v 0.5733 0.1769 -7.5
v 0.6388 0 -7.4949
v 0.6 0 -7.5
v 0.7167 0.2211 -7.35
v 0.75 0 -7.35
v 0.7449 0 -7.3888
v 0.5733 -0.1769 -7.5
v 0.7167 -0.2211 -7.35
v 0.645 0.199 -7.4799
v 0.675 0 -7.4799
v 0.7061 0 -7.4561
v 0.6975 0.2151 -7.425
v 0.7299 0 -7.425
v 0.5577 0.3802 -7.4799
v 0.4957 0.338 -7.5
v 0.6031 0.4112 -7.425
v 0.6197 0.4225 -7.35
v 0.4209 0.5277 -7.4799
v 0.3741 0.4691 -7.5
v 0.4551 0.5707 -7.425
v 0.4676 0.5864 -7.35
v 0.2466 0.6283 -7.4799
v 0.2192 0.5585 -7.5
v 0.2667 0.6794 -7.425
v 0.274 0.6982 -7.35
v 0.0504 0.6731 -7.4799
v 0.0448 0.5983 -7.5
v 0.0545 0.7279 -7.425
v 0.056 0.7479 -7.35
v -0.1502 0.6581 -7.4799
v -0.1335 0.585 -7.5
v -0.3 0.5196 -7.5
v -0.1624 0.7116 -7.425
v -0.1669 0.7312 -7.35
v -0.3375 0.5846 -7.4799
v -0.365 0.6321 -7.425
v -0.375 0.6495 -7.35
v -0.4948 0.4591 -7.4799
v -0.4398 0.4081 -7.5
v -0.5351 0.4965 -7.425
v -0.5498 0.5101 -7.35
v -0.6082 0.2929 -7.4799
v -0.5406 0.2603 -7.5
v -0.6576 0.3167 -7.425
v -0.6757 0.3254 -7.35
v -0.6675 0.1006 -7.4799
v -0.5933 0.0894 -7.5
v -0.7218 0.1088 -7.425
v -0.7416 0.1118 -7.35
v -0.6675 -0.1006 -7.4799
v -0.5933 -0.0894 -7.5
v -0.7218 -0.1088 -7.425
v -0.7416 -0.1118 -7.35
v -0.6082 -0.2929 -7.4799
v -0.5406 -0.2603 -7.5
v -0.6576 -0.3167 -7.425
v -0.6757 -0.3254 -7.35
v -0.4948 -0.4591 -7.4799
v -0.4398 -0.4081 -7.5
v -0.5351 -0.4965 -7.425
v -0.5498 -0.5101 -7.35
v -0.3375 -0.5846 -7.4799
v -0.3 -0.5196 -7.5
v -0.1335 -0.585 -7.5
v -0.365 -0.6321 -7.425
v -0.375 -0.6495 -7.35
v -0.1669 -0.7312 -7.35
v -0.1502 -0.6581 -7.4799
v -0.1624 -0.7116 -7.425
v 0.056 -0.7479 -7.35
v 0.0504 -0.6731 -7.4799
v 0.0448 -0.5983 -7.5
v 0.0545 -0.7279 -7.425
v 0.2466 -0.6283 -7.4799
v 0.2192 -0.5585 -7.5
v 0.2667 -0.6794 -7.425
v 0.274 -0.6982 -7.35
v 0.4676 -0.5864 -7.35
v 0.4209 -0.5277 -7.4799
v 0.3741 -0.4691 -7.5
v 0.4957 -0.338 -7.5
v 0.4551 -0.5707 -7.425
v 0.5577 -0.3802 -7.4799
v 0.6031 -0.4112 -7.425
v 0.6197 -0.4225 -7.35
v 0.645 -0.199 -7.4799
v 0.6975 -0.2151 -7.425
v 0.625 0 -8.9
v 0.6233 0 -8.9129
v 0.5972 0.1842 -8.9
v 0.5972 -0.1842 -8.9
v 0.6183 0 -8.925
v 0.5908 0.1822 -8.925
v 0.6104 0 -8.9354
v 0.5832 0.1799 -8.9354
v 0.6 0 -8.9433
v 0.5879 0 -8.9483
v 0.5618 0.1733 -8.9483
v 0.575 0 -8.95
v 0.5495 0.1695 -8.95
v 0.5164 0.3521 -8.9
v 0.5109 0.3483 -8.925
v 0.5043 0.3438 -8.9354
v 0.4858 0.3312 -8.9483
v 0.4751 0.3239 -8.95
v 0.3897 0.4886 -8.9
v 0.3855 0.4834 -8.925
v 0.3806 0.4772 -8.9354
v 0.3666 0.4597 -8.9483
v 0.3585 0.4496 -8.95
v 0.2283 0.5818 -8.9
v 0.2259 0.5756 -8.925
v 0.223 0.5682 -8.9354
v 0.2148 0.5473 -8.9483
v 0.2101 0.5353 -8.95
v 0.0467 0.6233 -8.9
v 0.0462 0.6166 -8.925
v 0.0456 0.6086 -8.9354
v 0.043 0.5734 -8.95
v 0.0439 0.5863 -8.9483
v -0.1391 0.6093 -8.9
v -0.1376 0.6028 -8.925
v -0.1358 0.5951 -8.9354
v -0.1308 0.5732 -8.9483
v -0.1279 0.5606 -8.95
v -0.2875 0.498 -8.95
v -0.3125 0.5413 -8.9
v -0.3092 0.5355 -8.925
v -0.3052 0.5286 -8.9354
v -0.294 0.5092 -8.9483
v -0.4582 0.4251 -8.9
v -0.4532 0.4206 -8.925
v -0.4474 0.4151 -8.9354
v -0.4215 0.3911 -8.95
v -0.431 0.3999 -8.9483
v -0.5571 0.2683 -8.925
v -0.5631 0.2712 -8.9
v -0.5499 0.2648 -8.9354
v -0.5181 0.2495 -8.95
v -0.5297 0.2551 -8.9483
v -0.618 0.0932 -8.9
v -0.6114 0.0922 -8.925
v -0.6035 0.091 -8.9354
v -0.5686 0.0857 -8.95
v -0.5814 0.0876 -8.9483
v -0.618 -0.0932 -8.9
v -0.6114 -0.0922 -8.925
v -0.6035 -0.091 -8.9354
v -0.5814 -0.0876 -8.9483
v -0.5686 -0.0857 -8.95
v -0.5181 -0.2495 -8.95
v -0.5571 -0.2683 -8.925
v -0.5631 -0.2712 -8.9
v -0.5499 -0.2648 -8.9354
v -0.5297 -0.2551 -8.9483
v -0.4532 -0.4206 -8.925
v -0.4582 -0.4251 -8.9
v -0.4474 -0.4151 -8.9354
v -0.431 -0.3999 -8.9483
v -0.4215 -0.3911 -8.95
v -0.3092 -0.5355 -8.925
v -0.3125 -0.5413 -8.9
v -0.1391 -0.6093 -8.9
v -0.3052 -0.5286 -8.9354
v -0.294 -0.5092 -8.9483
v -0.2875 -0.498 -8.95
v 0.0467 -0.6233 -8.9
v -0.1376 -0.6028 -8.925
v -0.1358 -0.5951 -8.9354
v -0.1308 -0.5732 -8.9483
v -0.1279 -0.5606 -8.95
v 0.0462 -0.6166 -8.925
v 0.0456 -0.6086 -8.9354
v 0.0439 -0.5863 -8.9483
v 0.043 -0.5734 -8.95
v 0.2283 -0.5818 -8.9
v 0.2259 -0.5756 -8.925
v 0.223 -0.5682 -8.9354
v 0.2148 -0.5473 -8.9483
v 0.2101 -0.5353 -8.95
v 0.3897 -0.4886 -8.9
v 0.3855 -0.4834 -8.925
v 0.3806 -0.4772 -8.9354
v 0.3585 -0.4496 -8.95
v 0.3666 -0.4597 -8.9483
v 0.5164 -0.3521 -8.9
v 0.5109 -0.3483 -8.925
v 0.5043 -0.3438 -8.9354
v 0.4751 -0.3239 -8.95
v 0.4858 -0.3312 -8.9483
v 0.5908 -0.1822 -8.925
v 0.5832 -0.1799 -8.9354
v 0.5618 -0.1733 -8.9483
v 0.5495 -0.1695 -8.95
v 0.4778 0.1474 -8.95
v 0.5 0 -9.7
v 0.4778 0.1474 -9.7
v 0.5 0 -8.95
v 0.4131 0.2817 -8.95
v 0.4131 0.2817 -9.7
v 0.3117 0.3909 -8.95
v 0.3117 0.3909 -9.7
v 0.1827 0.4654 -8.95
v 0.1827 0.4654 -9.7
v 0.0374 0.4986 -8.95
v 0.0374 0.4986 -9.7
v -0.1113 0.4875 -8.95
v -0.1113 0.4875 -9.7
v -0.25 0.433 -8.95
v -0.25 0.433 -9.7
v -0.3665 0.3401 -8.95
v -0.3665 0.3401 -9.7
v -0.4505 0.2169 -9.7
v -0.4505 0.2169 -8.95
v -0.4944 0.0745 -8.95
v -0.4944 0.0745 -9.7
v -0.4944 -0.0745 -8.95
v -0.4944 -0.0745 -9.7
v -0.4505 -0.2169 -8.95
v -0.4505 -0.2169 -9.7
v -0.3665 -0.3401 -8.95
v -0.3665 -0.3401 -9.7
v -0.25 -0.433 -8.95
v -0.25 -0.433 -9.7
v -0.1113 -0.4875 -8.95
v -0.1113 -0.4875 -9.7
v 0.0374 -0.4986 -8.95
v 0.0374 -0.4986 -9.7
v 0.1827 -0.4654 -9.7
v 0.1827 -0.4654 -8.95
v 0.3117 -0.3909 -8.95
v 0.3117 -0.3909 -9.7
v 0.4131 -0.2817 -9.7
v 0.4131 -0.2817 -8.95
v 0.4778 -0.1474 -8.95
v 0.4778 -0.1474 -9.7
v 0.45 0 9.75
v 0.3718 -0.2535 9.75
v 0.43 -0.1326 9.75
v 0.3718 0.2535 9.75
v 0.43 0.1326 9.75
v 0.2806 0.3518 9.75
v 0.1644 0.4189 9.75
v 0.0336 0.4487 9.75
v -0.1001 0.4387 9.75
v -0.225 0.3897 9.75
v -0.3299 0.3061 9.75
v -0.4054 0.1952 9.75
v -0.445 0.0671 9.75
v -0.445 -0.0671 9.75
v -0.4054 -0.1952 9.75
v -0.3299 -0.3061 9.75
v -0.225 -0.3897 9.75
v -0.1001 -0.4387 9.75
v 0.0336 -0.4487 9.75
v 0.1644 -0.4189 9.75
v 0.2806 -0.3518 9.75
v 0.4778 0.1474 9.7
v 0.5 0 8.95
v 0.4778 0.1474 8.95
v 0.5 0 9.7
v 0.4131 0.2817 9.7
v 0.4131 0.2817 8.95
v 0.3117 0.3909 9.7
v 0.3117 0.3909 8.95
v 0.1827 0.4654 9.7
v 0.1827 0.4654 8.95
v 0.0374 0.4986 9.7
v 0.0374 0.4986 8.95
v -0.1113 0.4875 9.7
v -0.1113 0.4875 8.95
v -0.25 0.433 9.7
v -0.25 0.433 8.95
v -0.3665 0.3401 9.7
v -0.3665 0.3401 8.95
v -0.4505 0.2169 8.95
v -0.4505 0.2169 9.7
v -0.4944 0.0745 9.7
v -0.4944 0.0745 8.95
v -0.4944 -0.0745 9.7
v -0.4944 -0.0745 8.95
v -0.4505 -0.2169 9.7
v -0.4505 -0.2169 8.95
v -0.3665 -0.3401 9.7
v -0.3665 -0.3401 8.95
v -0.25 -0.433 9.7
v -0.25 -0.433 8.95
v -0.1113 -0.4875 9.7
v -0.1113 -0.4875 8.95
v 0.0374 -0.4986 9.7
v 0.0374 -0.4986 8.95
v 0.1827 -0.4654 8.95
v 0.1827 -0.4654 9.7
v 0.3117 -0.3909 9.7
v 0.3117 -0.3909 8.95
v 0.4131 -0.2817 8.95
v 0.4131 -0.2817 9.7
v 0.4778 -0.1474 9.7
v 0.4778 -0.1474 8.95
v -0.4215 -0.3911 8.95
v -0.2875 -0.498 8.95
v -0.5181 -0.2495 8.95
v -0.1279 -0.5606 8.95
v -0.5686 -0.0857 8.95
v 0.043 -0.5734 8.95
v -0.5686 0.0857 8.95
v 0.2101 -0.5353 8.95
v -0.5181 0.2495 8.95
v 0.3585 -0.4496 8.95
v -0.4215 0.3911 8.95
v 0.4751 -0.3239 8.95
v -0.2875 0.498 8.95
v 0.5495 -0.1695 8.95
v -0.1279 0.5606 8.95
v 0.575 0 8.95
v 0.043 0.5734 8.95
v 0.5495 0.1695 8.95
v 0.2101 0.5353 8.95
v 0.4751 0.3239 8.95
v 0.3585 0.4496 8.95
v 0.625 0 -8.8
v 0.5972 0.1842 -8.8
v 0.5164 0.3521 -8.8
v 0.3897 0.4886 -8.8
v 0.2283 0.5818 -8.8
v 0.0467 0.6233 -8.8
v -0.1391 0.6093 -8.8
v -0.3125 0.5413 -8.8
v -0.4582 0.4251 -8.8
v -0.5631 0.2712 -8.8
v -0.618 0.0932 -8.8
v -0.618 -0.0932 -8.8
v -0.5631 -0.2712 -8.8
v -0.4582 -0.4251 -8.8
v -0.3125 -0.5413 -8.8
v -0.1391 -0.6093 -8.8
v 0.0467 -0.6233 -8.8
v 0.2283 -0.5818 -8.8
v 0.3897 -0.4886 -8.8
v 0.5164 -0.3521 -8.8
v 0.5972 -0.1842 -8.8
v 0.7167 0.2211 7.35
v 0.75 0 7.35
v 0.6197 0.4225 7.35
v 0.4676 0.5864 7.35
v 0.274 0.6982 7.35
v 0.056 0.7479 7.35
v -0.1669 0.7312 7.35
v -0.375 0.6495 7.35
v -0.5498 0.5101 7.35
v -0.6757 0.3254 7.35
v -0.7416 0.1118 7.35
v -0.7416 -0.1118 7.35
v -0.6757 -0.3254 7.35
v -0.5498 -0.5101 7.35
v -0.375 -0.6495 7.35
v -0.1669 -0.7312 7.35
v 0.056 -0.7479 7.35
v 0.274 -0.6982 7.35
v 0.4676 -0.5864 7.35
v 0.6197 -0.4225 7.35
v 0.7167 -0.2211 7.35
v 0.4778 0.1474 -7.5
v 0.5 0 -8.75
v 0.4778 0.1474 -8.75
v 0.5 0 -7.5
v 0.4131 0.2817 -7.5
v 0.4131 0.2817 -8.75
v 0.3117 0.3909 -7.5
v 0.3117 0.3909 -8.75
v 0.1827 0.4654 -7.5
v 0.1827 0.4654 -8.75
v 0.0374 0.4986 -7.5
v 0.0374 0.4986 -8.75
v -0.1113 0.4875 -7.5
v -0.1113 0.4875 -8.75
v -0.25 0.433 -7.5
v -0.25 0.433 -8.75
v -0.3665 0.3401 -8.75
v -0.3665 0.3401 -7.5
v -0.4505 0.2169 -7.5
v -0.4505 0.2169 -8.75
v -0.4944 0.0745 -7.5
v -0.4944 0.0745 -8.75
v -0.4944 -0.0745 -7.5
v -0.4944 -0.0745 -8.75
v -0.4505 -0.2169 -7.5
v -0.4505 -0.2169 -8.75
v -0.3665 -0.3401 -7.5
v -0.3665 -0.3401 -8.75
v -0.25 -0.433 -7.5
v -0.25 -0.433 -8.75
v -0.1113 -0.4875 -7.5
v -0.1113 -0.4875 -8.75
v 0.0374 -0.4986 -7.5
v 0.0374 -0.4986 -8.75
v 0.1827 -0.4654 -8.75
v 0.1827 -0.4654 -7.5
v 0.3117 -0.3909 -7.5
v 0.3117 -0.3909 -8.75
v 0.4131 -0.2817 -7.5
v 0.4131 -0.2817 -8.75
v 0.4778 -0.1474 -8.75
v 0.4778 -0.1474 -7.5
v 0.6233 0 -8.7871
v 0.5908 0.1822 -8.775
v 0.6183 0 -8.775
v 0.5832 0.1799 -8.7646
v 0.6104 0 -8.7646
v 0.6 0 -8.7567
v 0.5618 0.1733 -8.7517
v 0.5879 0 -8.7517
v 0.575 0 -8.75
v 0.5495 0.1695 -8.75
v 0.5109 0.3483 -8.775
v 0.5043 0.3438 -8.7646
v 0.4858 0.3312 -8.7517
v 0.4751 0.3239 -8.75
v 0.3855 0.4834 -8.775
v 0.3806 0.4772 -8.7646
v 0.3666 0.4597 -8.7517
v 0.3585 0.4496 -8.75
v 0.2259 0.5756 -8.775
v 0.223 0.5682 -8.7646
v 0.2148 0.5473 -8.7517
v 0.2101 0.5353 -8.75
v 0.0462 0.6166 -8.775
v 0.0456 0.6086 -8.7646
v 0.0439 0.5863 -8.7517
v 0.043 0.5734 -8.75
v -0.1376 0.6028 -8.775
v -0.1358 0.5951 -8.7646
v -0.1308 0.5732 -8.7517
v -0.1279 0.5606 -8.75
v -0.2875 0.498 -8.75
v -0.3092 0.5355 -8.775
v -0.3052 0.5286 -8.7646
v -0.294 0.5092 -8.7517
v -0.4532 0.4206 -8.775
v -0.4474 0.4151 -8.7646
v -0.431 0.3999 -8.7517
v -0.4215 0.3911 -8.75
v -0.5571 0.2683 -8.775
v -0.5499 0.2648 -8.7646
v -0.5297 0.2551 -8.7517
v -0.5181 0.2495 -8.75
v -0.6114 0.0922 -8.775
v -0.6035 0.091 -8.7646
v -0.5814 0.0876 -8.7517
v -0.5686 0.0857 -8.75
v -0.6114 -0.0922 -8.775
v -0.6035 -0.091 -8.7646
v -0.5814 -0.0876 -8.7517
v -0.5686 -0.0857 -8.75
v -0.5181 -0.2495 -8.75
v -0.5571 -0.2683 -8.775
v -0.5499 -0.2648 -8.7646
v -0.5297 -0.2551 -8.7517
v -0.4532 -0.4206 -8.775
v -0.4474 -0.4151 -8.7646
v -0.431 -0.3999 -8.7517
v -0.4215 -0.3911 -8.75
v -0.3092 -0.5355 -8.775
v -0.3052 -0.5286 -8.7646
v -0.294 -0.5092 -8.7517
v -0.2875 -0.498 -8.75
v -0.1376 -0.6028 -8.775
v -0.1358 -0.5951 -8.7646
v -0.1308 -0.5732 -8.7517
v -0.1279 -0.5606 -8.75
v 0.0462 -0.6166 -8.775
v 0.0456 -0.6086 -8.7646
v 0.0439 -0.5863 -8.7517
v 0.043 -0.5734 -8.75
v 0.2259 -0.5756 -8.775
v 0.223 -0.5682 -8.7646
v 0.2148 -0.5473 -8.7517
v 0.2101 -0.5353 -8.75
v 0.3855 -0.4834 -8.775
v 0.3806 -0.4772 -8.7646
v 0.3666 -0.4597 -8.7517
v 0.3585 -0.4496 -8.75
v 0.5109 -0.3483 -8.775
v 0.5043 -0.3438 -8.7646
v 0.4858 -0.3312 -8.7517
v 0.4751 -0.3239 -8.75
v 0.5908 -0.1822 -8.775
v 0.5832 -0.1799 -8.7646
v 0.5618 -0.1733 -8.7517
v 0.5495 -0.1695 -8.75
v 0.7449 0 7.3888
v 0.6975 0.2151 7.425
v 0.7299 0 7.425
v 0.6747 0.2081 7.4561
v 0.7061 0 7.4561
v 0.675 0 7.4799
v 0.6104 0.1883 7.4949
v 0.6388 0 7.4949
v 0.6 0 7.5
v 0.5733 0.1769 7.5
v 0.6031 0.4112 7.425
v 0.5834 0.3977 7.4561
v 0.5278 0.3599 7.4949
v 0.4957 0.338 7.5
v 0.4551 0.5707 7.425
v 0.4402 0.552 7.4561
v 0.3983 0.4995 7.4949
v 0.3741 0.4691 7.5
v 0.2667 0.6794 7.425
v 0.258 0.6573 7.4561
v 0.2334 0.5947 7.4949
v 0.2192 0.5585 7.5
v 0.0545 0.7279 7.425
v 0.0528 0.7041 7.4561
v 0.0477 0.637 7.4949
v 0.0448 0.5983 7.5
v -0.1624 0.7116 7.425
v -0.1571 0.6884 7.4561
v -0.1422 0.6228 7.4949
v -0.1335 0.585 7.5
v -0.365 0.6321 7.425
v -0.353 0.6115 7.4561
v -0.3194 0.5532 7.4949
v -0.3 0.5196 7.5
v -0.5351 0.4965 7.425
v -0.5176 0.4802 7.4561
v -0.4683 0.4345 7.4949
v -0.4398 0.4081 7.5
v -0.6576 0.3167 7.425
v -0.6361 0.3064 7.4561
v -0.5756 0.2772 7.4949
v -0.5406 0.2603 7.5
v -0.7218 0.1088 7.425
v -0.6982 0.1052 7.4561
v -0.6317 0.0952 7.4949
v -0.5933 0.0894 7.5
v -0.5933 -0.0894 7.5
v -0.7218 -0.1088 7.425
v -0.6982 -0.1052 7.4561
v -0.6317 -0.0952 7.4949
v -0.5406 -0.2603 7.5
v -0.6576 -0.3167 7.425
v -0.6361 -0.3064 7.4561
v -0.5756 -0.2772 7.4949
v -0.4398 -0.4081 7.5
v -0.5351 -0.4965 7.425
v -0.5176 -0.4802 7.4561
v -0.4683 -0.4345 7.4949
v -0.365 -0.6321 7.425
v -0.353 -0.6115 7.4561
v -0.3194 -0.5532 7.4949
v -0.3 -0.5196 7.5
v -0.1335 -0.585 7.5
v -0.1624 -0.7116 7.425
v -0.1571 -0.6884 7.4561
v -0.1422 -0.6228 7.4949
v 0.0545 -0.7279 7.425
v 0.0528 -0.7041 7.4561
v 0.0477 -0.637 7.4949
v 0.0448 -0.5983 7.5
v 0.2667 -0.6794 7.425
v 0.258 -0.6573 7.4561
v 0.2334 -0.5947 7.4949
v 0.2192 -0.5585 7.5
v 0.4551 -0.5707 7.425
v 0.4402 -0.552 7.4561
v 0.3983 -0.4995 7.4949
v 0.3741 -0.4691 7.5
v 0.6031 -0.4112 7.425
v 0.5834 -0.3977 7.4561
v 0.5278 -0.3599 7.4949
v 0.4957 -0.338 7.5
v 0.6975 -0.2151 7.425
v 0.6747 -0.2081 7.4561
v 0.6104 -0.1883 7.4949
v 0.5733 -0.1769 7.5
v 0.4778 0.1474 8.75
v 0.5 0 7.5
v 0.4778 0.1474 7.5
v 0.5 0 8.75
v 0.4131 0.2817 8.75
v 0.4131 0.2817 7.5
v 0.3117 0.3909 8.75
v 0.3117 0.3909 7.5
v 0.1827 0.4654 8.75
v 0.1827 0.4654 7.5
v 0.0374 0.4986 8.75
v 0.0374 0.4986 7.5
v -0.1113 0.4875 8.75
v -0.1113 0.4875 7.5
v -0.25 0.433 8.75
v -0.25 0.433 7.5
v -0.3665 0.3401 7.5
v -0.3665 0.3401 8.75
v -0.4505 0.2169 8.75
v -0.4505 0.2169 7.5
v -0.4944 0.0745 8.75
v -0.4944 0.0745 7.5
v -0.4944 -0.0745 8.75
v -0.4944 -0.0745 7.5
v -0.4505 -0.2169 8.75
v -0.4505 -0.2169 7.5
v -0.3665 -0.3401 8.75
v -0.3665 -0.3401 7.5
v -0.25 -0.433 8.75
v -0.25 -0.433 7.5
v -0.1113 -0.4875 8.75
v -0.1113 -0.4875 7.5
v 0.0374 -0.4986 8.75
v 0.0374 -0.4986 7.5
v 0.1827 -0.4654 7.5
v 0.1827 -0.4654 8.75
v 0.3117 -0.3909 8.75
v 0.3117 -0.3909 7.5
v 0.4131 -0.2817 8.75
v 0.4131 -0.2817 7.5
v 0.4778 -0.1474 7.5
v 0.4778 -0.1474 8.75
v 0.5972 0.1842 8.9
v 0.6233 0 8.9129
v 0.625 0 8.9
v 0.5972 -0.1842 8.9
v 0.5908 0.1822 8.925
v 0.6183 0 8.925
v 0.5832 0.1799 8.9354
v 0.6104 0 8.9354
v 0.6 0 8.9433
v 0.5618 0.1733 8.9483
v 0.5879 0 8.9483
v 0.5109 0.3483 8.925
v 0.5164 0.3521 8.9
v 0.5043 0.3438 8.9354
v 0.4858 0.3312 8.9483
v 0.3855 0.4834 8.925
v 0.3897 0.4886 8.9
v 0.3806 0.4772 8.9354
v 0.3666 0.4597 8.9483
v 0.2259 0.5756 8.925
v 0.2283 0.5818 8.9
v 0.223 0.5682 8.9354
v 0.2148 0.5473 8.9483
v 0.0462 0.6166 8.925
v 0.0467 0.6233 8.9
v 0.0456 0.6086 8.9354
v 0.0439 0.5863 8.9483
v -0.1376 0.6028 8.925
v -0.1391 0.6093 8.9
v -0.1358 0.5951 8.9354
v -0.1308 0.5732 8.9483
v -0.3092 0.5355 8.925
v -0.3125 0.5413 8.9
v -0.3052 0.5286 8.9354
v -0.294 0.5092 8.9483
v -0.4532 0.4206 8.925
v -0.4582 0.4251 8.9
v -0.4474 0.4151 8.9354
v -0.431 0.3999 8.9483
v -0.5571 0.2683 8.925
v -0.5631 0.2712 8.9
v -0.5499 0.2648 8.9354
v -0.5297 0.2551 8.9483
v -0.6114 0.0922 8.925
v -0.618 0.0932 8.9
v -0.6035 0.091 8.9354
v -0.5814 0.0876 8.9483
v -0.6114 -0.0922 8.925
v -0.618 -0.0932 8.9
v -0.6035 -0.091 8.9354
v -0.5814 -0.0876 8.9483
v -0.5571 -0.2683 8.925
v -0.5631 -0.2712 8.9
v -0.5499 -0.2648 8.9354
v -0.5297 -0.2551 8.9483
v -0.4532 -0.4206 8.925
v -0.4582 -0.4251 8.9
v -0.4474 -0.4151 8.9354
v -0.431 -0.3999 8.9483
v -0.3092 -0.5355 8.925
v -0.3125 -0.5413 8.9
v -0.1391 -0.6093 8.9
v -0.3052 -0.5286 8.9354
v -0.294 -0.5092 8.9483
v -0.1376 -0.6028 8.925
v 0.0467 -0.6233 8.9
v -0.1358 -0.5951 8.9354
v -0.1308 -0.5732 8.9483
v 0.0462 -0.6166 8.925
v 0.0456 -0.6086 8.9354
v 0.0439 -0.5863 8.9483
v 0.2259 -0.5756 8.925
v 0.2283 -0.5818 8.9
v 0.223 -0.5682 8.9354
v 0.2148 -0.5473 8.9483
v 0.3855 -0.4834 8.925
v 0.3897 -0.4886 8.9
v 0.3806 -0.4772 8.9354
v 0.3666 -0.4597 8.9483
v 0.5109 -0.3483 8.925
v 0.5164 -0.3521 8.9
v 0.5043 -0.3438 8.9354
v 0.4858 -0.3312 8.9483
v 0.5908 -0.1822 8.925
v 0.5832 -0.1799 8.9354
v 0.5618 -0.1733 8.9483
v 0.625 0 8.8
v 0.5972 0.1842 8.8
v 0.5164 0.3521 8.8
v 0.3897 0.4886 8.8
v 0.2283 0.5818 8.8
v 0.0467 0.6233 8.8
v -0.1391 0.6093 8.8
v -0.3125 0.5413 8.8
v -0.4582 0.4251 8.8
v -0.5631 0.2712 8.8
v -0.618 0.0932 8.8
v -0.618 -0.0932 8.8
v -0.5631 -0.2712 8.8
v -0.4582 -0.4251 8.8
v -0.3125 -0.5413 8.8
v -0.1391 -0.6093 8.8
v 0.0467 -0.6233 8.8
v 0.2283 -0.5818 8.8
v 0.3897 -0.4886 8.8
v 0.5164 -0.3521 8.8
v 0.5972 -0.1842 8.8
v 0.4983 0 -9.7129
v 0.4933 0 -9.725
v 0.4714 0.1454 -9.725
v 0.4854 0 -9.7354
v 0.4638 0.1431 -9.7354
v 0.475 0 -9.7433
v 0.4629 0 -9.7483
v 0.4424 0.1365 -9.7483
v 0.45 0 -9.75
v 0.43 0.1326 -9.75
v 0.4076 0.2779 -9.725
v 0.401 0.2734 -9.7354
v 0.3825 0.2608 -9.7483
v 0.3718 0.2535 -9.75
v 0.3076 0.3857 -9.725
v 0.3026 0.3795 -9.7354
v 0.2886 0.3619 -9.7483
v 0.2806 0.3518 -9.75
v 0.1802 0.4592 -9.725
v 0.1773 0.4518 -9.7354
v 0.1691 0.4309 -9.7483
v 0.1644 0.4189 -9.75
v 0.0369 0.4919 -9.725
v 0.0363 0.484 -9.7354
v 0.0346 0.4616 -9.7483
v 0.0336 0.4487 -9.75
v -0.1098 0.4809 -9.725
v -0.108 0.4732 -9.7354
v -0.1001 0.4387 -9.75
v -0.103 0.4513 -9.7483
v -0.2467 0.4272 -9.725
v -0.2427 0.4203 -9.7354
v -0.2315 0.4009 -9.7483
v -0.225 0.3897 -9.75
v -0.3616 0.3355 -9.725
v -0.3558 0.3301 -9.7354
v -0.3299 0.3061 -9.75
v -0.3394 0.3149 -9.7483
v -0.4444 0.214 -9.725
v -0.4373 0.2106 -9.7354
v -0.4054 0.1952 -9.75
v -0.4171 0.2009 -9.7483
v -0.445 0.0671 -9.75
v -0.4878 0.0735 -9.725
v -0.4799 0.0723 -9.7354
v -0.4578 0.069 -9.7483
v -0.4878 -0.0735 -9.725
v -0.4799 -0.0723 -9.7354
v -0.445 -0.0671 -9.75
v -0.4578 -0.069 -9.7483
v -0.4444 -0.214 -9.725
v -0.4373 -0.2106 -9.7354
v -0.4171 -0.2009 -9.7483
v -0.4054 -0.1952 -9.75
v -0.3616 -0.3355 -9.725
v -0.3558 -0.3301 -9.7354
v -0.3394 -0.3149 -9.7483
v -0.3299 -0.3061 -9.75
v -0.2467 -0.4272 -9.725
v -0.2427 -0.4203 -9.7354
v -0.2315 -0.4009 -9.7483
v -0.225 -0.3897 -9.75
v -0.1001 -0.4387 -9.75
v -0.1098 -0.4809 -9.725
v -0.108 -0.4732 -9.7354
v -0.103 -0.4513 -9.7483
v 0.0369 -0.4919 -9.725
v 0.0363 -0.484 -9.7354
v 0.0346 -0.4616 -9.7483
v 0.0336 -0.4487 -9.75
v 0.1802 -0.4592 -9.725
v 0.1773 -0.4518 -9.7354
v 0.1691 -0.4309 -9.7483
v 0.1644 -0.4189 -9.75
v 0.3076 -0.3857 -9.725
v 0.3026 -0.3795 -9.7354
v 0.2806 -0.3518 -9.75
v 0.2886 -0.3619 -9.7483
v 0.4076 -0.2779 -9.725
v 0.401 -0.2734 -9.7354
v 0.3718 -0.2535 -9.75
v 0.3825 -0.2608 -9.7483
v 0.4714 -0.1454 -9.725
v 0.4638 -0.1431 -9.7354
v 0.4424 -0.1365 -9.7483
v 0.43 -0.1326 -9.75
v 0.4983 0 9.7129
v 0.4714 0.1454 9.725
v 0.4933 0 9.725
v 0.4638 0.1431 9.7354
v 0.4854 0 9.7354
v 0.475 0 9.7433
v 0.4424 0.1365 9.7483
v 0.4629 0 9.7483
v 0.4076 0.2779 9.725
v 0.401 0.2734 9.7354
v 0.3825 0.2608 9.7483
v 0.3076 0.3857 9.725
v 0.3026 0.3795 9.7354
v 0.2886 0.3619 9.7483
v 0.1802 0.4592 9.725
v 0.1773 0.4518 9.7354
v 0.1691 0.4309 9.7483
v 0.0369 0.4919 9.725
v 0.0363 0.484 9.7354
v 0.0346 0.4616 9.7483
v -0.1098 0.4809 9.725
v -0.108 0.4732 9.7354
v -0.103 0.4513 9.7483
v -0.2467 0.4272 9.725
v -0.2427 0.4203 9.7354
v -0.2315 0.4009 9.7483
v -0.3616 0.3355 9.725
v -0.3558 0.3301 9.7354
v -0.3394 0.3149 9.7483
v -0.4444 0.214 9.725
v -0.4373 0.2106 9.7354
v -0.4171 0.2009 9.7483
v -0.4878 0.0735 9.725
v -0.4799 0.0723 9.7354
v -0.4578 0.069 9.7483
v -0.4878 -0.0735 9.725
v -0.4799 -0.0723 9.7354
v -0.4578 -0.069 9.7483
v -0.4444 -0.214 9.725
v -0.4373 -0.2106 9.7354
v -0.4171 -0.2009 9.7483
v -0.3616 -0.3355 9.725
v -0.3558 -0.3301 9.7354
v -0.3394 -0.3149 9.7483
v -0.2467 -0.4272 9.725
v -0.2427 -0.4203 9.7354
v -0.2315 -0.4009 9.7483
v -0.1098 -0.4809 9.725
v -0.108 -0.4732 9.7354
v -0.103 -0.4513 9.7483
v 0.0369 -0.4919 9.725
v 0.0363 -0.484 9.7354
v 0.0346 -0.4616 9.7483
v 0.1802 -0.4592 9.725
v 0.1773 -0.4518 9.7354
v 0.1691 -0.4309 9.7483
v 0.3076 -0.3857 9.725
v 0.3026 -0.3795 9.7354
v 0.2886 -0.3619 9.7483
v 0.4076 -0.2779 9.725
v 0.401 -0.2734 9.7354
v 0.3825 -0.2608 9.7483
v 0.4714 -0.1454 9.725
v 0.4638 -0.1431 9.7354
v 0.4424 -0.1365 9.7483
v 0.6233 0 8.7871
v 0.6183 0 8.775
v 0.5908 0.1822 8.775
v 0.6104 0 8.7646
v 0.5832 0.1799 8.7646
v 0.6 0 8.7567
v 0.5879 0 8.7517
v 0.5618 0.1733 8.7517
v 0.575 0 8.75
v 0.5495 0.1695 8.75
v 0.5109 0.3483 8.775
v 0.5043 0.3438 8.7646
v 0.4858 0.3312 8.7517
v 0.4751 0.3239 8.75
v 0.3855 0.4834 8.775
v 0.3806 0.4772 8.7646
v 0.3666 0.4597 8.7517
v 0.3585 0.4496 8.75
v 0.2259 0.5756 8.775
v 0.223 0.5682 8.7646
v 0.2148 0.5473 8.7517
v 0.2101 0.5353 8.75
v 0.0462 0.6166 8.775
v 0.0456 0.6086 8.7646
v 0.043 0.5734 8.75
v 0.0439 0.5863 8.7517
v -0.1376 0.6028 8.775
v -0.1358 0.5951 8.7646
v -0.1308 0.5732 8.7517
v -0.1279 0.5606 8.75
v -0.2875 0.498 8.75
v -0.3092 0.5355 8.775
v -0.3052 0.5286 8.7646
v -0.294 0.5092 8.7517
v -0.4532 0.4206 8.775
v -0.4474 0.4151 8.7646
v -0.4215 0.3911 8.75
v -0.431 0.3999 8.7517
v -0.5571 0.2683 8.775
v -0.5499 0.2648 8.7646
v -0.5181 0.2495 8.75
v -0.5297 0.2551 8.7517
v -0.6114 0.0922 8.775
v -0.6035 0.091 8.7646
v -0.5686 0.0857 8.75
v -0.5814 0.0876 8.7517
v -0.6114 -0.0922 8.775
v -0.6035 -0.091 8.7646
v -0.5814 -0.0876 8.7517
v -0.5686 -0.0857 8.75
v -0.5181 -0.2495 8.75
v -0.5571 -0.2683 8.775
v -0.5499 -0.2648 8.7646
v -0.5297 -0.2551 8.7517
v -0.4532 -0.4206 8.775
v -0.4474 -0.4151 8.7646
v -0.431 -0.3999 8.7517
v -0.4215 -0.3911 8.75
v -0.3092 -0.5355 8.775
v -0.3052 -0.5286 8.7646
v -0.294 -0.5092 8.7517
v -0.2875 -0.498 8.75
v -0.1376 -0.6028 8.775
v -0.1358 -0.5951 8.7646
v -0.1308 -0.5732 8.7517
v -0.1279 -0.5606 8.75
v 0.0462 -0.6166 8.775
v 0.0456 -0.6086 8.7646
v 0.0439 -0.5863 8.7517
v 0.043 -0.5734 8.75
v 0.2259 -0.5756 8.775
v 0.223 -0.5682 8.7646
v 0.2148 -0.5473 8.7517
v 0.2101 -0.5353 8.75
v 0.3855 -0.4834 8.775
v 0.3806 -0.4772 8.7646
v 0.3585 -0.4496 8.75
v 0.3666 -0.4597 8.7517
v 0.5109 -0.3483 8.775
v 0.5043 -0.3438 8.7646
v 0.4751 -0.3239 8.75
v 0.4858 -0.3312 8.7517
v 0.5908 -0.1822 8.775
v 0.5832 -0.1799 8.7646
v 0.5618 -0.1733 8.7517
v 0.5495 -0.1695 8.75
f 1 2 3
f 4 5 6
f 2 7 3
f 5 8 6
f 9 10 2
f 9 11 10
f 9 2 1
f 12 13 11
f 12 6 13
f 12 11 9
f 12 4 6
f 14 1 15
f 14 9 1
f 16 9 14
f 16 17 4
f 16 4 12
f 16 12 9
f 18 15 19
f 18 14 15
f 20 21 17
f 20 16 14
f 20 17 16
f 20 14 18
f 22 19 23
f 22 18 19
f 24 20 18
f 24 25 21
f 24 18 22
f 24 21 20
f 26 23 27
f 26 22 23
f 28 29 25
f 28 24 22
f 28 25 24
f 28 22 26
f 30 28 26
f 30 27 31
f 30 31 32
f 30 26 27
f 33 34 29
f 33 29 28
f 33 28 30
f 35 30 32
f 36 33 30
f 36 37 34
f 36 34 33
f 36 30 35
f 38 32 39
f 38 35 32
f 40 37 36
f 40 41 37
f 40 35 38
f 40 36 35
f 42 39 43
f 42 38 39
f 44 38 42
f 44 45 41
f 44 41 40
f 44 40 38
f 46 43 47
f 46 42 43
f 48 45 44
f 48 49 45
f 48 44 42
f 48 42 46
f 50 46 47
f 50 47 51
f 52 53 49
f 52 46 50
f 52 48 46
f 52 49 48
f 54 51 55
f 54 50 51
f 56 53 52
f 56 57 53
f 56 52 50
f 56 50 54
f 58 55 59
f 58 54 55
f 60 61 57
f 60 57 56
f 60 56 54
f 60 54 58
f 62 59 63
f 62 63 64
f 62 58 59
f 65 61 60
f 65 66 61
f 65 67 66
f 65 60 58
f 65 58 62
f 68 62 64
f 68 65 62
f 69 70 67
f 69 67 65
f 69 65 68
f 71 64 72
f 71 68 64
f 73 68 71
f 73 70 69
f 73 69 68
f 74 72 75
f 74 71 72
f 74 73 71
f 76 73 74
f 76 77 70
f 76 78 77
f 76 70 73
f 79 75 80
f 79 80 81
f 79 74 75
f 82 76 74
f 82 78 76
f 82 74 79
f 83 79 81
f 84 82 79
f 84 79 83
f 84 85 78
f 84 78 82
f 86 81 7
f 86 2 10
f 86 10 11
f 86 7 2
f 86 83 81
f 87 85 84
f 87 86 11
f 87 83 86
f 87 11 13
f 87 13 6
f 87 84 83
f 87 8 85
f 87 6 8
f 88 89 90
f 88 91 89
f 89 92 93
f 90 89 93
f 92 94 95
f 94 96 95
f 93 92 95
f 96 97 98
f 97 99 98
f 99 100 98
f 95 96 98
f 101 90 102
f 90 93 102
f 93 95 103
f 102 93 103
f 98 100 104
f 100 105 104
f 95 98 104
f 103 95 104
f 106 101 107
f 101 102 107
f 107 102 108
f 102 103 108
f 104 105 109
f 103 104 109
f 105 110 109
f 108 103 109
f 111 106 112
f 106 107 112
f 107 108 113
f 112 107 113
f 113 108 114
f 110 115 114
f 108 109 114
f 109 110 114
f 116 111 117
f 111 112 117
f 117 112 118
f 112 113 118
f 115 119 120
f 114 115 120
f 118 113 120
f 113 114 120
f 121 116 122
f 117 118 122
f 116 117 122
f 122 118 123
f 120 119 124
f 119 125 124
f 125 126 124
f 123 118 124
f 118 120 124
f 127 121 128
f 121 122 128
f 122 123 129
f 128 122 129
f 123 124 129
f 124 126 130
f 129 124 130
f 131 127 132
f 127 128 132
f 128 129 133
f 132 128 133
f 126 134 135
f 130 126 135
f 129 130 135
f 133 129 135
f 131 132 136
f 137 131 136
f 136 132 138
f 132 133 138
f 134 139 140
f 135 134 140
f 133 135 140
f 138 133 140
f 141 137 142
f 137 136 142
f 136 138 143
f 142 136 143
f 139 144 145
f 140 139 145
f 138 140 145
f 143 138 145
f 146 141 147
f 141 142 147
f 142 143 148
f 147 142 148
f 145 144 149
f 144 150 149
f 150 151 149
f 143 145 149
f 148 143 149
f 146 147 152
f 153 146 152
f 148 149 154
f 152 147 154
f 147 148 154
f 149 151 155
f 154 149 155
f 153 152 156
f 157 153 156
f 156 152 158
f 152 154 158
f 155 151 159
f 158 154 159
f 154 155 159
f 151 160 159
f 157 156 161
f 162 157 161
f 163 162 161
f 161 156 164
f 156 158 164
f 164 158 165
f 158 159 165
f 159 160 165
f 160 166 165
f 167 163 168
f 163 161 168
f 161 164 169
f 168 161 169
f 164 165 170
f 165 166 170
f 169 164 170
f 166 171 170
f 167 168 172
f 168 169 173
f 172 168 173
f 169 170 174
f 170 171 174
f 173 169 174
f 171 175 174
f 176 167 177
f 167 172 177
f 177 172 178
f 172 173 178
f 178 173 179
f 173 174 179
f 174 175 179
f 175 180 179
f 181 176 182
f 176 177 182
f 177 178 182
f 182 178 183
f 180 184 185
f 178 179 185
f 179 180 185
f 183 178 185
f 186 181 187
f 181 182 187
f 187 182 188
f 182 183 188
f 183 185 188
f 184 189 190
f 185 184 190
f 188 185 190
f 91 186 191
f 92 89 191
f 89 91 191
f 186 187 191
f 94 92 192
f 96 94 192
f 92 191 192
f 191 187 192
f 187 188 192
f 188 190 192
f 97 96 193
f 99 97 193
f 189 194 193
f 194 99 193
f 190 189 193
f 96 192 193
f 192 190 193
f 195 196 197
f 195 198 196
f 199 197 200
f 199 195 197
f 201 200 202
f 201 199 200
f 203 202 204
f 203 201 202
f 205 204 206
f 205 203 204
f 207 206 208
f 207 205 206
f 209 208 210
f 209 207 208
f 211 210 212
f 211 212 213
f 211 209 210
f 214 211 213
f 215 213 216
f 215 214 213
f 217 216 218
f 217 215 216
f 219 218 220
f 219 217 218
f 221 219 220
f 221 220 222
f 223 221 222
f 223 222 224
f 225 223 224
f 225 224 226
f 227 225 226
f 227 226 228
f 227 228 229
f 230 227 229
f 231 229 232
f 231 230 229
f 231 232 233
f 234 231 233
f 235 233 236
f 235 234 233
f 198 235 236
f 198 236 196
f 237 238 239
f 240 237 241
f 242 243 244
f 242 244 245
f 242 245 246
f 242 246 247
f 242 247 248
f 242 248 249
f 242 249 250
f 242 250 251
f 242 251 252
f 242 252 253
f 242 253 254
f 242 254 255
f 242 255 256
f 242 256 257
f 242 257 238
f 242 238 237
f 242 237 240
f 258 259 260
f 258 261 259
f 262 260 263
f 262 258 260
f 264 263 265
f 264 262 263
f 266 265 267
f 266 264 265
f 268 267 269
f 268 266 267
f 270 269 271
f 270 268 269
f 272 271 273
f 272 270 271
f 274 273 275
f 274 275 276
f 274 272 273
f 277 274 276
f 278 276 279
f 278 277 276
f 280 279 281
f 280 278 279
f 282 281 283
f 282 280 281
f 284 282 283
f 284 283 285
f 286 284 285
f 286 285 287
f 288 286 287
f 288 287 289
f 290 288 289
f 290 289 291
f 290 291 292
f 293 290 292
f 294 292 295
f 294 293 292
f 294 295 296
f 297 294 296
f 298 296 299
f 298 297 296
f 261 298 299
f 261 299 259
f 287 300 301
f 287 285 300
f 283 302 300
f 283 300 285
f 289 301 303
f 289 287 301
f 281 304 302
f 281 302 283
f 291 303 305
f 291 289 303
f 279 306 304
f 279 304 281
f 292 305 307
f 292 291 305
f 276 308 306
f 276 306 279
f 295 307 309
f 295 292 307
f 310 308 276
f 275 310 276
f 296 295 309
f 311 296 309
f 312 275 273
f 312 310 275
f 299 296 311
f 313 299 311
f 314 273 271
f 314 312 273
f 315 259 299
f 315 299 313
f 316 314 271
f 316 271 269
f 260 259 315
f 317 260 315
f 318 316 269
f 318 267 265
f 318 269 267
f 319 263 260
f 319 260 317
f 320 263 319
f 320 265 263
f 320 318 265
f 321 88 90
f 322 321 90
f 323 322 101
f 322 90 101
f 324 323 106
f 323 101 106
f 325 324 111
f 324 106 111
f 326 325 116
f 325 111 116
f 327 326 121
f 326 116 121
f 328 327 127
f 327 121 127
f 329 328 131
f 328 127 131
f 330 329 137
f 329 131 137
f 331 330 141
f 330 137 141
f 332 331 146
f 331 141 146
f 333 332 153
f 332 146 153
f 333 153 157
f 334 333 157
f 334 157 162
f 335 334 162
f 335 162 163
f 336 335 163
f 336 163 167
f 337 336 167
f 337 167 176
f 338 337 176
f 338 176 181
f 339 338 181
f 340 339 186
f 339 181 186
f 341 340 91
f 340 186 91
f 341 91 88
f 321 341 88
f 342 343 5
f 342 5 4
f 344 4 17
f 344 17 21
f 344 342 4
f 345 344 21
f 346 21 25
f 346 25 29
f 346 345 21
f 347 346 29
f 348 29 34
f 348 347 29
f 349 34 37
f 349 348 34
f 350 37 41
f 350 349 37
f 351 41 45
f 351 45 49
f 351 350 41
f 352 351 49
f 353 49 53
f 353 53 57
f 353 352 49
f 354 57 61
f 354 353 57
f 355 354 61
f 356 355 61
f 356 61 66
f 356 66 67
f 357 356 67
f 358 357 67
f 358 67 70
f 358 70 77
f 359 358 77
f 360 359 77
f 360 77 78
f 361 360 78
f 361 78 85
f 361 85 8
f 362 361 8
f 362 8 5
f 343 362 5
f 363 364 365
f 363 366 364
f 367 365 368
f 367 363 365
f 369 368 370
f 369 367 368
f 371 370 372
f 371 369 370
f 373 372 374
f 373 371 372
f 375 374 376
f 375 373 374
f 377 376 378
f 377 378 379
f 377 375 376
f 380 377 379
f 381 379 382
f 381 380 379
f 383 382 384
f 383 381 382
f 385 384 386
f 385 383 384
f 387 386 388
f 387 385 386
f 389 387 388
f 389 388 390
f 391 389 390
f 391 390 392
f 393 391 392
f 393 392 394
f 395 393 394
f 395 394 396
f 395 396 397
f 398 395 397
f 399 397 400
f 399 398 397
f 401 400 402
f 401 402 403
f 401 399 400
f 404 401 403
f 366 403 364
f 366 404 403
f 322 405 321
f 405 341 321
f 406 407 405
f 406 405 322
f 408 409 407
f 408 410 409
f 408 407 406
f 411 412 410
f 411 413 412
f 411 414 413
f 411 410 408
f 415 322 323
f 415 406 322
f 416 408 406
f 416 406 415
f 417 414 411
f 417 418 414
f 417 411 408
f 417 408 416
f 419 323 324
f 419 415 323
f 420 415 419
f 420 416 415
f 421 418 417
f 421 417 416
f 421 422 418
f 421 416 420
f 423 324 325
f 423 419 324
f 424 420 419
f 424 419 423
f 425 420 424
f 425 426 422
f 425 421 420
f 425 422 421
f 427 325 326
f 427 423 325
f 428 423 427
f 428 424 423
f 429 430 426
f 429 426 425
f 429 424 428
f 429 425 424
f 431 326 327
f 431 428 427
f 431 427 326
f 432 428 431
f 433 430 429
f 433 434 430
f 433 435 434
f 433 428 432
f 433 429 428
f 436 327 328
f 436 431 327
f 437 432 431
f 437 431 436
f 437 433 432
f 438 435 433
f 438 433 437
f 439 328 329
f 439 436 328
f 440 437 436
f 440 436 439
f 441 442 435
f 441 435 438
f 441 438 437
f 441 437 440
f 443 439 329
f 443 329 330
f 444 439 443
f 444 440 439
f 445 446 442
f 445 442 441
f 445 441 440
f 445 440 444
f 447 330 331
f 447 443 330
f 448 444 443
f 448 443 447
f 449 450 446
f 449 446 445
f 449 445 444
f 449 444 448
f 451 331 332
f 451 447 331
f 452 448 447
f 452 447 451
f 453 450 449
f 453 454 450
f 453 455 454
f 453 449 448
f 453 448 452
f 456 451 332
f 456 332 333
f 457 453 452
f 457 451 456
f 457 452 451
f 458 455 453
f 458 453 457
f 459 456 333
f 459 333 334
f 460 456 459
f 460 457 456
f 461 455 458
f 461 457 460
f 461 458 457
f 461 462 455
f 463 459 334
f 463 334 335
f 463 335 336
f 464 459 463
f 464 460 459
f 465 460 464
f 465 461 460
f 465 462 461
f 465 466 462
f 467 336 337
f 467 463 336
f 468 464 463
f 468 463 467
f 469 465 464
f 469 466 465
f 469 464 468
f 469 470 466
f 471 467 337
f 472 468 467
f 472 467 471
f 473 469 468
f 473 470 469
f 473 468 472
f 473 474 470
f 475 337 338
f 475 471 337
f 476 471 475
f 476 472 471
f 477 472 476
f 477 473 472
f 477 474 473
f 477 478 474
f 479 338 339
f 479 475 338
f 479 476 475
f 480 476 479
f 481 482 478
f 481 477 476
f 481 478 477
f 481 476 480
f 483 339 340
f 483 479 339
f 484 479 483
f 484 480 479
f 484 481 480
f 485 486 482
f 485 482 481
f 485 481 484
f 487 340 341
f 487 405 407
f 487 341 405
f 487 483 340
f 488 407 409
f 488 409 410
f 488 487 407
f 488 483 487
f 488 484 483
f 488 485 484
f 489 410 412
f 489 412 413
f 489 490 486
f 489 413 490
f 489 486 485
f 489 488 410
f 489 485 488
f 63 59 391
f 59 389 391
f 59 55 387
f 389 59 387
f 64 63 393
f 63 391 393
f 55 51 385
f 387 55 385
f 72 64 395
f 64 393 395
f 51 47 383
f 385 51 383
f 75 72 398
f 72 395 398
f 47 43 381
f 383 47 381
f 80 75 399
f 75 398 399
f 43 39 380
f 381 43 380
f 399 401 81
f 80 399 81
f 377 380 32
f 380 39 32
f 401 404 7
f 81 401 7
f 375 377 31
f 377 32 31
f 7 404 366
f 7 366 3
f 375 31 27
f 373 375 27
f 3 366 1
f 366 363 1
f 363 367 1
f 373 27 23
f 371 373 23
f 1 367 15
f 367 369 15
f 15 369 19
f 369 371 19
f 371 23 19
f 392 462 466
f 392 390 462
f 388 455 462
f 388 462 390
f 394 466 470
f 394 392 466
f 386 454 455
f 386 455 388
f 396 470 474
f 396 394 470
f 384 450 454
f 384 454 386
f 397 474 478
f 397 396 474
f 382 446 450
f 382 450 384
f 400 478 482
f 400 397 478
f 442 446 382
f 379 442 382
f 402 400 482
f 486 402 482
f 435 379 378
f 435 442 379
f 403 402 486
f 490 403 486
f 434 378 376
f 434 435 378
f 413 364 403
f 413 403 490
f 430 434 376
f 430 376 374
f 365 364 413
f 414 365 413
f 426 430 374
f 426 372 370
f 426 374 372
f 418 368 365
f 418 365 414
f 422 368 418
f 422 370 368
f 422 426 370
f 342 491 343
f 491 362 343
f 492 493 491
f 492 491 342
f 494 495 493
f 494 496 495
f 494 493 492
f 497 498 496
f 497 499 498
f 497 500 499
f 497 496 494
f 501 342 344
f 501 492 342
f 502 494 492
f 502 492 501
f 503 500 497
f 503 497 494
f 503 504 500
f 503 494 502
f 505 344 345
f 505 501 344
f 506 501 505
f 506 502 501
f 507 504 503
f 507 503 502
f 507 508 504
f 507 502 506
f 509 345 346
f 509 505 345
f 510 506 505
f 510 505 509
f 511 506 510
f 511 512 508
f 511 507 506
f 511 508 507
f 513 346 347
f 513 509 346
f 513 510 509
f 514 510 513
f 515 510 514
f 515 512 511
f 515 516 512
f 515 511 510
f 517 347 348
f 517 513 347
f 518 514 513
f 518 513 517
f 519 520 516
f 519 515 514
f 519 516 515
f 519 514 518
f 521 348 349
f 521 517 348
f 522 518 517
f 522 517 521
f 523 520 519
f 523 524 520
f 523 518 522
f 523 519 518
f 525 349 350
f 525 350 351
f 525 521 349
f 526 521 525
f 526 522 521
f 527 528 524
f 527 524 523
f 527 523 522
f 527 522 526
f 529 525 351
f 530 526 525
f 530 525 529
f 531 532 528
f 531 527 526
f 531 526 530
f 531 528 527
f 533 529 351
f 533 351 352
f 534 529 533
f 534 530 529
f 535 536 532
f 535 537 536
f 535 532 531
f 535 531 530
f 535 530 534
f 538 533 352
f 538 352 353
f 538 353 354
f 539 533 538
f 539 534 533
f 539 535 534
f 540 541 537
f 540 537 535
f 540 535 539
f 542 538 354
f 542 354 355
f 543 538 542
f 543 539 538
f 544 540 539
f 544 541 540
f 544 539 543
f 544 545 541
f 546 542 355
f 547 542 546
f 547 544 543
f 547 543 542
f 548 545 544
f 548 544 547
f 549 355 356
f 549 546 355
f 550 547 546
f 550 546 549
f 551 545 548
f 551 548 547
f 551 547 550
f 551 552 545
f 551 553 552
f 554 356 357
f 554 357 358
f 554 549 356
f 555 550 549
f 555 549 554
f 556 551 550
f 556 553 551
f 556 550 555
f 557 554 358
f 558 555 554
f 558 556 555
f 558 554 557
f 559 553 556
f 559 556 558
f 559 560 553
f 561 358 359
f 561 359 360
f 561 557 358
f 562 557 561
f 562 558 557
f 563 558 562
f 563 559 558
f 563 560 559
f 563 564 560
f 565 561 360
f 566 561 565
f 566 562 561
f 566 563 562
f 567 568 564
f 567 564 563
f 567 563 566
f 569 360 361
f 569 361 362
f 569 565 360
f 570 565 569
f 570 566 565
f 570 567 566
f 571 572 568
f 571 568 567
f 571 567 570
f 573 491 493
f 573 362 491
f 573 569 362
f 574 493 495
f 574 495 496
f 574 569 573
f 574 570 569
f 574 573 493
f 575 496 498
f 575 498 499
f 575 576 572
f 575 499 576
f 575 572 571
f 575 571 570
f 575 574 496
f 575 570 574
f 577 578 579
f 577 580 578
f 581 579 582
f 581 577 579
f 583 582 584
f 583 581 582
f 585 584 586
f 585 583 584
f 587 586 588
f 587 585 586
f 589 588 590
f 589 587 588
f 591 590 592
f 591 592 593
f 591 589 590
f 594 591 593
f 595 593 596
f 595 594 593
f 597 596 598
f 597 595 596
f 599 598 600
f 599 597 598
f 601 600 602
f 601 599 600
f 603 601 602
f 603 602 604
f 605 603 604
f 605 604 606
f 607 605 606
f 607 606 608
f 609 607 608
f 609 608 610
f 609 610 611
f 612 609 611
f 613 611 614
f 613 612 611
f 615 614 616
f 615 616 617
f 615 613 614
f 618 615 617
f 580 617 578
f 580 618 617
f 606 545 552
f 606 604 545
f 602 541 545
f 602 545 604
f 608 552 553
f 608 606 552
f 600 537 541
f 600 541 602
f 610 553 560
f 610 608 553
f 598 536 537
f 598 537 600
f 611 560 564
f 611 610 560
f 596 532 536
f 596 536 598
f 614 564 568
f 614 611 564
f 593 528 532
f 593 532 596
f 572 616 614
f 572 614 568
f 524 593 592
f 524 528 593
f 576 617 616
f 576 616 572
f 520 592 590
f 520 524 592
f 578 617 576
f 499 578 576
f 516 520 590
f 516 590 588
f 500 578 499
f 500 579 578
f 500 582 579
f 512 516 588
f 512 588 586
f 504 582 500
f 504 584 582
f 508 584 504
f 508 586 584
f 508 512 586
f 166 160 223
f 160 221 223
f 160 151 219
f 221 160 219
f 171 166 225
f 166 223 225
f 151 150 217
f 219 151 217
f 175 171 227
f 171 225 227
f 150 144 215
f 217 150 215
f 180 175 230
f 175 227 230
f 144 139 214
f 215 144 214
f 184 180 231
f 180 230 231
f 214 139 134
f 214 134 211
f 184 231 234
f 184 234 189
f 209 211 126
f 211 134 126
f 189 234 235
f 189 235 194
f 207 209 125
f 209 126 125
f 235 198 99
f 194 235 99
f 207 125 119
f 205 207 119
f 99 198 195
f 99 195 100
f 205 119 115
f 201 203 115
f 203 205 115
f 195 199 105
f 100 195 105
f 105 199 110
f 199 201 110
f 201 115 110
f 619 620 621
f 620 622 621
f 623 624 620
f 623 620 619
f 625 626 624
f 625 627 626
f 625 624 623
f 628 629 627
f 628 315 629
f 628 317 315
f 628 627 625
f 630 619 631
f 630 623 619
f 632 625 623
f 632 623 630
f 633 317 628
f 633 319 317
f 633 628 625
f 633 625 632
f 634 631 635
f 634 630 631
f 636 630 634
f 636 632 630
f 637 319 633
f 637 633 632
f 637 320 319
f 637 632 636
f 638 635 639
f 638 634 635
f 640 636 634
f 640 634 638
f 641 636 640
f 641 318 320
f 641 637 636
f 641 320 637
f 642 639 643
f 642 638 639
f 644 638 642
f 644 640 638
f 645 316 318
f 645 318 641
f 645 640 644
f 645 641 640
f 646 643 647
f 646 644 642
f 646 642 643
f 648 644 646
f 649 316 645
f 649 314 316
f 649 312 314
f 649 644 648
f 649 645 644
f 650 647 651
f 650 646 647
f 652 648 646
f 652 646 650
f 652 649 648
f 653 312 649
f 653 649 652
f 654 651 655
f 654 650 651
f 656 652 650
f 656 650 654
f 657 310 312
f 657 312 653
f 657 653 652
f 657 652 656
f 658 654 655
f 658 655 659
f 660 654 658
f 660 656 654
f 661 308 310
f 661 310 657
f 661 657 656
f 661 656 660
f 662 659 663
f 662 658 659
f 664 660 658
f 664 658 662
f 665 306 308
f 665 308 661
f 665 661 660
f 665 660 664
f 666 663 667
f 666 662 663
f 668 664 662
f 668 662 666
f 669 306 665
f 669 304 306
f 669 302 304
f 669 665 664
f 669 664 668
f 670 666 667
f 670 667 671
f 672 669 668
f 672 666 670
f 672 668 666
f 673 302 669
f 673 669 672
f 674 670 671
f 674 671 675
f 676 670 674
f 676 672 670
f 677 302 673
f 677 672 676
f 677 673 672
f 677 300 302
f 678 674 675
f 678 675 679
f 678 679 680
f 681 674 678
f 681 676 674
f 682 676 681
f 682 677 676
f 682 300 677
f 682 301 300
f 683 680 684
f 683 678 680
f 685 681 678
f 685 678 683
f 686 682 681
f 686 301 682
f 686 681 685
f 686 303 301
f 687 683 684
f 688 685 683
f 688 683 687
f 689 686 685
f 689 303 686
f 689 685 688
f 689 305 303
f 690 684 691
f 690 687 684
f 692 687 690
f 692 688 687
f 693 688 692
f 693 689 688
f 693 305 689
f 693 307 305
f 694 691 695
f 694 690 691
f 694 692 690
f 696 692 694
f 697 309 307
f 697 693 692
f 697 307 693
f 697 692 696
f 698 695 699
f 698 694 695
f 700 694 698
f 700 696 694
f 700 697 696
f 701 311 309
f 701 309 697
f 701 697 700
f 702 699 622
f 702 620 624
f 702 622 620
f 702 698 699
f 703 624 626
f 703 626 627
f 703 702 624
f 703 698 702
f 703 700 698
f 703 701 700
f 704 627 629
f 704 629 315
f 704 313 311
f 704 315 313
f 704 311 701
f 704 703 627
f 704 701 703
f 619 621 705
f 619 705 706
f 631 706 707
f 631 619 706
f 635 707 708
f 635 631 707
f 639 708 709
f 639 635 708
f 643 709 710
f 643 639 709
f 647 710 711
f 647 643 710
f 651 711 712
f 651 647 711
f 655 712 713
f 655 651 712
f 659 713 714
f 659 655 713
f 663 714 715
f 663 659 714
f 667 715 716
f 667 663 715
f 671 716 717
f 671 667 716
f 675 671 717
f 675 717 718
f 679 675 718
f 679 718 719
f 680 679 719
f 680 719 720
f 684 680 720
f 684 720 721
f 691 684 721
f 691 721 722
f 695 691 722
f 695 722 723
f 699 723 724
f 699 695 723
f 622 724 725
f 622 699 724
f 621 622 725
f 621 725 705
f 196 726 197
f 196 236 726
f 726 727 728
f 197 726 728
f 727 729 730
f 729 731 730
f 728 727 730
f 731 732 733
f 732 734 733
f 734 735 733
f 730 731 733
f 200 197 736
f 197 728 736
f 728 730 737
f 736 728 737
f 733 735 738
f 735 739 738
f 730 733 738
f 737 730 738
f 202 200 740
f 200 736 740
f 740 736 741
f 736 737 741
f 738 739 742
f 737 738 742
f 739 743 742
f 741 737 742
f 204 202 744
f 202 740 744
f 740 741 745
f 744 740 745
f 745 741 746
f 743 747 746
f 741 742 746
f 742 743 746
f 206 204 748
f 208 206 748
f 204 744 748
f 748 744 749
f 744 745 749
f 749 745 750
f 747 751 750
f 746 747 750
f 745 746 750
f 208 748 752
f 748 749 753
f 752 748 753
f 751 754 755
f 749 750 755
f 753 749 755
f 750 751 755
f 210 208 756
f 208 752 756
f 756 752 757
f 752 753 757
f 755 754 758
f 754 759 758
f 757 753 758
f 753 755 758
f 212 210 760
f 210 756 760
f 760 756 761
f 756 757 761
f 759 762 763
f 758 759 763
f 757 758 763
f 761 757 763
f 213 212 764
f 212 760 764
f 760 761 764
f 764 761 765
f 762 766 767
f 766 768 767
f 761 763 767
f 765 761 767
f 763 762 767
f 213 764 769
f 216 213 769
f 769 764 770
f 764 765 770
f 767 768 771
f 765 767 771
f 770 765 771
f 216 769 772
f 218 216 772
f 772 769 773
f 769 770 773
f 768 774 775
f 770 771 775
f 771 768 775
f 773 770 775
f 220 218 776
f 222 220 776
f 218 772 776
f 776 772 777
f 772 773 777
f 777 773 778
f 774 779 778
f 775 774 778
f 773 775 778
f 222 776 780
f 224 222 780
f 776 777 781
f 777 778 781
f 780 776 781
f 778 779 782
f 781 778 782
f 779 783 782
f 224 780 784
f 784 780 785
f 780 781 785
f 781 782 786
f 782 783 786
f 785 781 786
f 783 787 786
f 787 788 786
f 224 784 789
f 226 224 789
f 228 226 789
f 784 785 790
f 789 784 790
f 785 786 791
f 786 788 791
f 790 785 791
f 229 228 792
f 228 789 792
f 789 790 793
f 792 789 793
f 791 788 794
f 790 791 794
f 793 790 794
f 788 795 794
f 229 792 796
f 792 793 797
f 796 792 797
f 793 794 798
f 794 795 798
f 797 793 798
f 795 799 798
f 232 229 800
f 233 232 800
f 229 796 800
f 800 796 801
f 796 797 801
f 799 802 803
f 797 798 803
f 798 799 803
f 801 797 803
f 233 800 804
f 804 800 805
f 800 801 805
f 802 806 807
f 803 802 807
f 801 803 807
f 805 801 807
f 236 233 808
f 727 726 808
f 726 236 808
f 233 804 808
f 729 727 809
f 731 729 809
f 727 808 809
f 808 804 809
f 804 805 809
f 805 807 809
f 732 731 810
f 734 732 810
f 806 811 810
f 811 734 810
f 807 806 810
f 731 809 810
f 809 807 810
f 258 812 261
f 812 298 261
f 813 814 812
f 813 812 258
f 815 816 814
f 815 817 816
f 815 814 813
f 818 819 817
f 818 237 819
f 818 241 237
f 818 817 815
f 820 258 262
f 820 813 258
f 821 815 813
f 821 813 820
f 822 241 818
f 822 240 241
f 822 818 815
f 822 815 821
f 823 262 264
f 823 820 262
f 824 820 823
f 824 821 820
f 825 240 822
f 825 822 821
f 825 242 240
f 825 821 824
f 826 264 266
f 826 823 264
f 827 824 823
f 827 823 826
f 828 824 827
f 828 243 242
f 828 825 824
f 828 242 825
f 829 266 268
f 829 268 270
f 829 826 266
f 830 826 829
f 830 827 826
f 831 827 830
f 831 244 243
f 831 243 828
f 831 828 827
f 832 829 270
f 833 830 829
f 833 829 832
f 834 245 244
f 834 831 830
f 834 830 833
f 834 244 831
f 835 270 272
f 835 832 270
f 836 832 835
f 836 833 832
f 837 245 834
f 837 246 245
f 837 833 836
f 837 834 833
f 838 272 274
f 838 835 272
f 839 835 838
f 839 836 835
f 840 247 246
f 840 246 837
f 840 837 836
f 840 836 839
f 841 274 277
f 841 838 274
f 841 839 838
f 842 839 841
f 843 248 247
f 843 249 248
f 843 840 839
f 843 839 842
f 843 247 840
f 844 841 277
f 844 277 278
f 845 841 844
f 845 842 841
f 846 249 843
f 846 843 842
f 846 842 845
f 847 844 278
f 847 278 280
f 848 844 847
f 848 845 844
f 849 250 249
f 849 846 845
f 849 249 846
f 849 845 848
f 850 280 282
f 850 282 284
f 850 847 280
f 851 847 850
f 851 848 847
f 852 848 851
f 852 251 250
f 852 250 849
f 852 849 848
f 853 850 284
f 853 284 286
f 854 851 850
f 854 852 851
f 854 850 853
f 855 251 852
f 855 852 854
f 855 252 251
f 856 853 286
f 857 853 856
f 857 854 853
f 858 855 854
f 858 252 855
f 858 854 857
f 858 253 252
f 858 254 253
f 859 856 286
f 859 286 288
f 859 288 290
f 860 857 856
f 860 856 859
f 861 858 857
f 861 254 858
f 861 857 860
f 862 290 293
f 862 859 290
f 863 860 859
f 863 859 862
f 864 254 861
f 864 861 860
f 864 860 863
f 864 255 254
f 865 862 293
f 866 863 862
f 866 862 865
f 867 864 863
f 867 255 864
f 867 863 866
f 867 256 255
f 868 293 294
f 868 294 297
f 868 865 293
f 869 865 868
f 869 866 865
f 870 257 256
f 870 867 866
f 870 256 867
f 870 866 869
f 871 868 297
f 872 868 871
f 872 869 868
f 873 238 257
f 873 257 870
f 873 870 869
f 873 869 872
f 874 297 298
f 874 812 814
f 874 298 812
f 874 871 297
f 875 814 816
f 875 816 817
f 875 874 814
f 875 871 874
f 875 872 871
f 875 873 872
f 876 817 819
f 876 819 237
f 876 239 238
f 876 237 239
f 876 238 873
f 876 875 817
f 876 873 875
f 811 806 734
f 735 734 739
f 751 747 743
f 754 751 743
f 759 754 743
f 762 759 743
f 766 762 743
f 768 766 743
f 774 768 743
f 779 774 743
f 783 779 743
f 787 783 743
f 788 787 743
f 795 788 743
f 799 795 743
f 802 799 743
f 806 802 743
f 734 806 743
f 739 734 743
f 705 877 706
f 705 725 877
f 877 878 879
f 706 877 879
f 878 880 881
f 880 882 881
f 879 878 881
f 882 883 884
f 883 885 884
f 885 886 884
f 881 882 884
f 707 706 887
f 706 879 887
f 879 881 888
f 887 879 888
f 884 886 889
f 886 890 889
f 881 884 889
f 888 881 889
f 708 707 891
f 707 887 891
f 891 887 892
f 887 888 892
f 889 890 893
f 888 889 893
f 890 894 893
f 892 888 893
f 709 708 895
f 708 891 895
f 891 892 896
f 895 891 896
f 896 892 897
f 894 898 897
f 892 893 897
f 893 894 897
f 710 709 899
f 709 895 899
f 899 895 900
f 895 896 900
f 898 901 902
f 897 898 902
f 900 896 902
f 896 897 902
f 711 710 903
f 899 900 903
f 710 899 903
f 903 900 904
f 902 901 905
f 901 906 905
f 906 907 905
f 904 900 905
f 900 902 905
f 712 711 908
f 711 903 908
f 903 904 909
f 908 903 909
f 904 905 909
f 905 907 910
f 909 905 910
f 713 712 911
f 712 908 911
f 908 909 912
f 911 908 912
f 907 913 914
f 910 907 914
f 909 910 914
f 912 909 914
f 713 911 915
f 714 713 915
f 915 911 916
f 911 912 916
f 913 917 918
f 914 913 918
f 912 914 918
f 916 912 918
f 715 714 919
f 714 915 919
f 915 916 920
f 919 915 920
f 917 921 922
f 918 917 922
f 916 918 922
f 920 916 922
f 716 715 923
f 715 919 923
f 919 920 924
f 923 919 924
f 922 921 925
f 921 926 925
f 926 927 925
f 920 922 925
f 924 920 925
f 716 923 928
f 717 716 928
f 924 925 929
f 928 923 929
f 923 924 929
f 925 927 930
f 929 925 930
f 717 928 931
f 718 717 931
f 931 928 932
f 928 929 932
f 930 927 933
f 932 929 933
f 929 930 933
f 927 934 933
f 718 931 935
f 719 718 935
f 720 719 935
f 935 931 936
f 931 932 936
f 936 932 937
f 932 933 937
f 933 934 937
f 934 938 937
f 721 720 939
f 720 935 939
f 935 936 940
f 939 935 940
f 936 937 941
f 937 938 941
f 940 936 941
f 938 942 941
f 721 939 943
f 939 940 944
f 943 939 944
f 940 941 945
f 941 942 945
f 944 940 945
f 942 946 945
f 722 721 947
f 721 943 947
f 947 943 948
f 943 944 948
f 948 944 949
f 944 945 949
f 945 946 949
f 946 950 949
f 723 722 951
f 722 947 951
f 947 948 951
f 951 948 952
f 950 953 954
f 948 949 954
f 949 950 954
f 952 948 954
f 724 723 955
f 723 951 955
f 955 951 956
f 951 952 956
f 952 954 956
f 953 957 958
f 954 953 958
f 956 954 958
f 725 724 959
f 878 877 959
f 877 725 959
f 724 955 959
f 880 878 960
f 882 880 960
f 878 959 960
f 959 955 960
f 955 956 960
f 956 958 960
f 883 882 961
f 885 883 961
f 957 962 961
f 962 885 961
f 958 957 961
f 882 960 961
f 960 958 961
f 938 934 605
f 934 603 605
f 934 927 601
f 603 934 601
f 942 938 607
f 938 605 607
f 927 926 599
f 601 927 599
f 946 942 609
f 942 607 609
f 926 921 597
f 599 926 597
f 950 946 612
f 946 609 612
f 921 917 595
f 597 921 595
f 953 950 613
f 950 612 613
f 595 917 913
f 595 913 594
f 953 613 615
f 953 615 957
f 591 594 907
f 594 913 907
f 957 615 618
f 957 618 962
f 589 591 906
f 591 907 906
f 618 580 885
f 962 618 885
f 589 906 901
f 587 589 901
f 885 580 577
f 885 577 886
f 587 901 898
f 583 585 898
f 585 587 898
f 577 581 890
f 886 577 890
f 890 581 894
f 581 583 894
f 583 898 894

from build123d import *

# Parameters (mm, degrees)
SKETCH1_R            = 0.75
BOSS_EXTRUDE1_DEPTH  = 7.5
SKETCH2_R            = 0.5
BOSS_EXTRUDE2_DEPTH  = 9.75
FILLET1_R            = 0.15
FILLET2_R            = 0.05
BOSS_EXTRUDE3_START  = -0.8
SKETCH3_R            = 0.625
BOSS_EXTRUDE3_DEPTH  = 0.2
FILLET3_R            = 0.05
FILLET3_OF_MIRROR1_R = 0.05


with BuildPart() as part:
    # Sketch1 → Boss-Extrude1 (new body, symmetric)
    with BuildSketch(Plane.XY):
        Circle(SKETCH1_R)
    extrude(amount=BOSS_EXTRUDE1_DEPTH, both=True)

    # Sketch2 → Boss-Extrude2 (add, symmetric)
    with BuildSketch(Plane.XY):
        Circle(SKETCH2_R)
    extrude(amount=BOSS_EXTRUDE2_DEPTH, both=True)

    # Fillet1
    fillet1_edges = [part.edges().sort_by_distance(p)[0] for p in [
        (-0.75, 0, -7.5),
        (-0.75, 0, 7.5),
    ]]
    fillet(fillet1_edges, radius=FILLET1_R)

    # Fillet2
    fillet2_edges = [part.edges().sort_by_distance(p)[0] for p in [
        (-0.5, 0, -9.75),
        (-0.5, 0, 9.75),
    ]]
    fillet(fillet2_edges, radius=FILLET2_R)

    # Sketch3 → Boss-Extrude3 (add)
    with BuildSketch(Plane.XY.offset(9.75).offset(BOSS_EXTRUDE3_START)):
        Circle(SKETCH3_R)
    boss_extrude3 = extrude(amount=-BOSS_EXTRUDE3_DEPTH)

    # Fillet3
    fillet3_edges = [part.edges().sort_by_distance(p)[0] for p in [
        (-0.625, 0, 8.95),
        (-0.625, 0, 8.75),
    ]]
    fillet(fillet3_edges, radius=FILLET3_R)

    # Mirror1: Boss-Extrude3 across plane
    add(boss_extrude3.mirror(Plane.XY))

    # Fillet3 of Mirror1
    fillet3_of_mirror1_edges = [part.edges().sort_by_distance(p)[0] for p in [
        (-0.625, 0, -8.95),
        (-0.625, 0, -8.75),
    ]]
    fillet(fillet3_of_mirror1_edges, radius=FILLET3_OF_MIRROR1_R)


solid = part.part
